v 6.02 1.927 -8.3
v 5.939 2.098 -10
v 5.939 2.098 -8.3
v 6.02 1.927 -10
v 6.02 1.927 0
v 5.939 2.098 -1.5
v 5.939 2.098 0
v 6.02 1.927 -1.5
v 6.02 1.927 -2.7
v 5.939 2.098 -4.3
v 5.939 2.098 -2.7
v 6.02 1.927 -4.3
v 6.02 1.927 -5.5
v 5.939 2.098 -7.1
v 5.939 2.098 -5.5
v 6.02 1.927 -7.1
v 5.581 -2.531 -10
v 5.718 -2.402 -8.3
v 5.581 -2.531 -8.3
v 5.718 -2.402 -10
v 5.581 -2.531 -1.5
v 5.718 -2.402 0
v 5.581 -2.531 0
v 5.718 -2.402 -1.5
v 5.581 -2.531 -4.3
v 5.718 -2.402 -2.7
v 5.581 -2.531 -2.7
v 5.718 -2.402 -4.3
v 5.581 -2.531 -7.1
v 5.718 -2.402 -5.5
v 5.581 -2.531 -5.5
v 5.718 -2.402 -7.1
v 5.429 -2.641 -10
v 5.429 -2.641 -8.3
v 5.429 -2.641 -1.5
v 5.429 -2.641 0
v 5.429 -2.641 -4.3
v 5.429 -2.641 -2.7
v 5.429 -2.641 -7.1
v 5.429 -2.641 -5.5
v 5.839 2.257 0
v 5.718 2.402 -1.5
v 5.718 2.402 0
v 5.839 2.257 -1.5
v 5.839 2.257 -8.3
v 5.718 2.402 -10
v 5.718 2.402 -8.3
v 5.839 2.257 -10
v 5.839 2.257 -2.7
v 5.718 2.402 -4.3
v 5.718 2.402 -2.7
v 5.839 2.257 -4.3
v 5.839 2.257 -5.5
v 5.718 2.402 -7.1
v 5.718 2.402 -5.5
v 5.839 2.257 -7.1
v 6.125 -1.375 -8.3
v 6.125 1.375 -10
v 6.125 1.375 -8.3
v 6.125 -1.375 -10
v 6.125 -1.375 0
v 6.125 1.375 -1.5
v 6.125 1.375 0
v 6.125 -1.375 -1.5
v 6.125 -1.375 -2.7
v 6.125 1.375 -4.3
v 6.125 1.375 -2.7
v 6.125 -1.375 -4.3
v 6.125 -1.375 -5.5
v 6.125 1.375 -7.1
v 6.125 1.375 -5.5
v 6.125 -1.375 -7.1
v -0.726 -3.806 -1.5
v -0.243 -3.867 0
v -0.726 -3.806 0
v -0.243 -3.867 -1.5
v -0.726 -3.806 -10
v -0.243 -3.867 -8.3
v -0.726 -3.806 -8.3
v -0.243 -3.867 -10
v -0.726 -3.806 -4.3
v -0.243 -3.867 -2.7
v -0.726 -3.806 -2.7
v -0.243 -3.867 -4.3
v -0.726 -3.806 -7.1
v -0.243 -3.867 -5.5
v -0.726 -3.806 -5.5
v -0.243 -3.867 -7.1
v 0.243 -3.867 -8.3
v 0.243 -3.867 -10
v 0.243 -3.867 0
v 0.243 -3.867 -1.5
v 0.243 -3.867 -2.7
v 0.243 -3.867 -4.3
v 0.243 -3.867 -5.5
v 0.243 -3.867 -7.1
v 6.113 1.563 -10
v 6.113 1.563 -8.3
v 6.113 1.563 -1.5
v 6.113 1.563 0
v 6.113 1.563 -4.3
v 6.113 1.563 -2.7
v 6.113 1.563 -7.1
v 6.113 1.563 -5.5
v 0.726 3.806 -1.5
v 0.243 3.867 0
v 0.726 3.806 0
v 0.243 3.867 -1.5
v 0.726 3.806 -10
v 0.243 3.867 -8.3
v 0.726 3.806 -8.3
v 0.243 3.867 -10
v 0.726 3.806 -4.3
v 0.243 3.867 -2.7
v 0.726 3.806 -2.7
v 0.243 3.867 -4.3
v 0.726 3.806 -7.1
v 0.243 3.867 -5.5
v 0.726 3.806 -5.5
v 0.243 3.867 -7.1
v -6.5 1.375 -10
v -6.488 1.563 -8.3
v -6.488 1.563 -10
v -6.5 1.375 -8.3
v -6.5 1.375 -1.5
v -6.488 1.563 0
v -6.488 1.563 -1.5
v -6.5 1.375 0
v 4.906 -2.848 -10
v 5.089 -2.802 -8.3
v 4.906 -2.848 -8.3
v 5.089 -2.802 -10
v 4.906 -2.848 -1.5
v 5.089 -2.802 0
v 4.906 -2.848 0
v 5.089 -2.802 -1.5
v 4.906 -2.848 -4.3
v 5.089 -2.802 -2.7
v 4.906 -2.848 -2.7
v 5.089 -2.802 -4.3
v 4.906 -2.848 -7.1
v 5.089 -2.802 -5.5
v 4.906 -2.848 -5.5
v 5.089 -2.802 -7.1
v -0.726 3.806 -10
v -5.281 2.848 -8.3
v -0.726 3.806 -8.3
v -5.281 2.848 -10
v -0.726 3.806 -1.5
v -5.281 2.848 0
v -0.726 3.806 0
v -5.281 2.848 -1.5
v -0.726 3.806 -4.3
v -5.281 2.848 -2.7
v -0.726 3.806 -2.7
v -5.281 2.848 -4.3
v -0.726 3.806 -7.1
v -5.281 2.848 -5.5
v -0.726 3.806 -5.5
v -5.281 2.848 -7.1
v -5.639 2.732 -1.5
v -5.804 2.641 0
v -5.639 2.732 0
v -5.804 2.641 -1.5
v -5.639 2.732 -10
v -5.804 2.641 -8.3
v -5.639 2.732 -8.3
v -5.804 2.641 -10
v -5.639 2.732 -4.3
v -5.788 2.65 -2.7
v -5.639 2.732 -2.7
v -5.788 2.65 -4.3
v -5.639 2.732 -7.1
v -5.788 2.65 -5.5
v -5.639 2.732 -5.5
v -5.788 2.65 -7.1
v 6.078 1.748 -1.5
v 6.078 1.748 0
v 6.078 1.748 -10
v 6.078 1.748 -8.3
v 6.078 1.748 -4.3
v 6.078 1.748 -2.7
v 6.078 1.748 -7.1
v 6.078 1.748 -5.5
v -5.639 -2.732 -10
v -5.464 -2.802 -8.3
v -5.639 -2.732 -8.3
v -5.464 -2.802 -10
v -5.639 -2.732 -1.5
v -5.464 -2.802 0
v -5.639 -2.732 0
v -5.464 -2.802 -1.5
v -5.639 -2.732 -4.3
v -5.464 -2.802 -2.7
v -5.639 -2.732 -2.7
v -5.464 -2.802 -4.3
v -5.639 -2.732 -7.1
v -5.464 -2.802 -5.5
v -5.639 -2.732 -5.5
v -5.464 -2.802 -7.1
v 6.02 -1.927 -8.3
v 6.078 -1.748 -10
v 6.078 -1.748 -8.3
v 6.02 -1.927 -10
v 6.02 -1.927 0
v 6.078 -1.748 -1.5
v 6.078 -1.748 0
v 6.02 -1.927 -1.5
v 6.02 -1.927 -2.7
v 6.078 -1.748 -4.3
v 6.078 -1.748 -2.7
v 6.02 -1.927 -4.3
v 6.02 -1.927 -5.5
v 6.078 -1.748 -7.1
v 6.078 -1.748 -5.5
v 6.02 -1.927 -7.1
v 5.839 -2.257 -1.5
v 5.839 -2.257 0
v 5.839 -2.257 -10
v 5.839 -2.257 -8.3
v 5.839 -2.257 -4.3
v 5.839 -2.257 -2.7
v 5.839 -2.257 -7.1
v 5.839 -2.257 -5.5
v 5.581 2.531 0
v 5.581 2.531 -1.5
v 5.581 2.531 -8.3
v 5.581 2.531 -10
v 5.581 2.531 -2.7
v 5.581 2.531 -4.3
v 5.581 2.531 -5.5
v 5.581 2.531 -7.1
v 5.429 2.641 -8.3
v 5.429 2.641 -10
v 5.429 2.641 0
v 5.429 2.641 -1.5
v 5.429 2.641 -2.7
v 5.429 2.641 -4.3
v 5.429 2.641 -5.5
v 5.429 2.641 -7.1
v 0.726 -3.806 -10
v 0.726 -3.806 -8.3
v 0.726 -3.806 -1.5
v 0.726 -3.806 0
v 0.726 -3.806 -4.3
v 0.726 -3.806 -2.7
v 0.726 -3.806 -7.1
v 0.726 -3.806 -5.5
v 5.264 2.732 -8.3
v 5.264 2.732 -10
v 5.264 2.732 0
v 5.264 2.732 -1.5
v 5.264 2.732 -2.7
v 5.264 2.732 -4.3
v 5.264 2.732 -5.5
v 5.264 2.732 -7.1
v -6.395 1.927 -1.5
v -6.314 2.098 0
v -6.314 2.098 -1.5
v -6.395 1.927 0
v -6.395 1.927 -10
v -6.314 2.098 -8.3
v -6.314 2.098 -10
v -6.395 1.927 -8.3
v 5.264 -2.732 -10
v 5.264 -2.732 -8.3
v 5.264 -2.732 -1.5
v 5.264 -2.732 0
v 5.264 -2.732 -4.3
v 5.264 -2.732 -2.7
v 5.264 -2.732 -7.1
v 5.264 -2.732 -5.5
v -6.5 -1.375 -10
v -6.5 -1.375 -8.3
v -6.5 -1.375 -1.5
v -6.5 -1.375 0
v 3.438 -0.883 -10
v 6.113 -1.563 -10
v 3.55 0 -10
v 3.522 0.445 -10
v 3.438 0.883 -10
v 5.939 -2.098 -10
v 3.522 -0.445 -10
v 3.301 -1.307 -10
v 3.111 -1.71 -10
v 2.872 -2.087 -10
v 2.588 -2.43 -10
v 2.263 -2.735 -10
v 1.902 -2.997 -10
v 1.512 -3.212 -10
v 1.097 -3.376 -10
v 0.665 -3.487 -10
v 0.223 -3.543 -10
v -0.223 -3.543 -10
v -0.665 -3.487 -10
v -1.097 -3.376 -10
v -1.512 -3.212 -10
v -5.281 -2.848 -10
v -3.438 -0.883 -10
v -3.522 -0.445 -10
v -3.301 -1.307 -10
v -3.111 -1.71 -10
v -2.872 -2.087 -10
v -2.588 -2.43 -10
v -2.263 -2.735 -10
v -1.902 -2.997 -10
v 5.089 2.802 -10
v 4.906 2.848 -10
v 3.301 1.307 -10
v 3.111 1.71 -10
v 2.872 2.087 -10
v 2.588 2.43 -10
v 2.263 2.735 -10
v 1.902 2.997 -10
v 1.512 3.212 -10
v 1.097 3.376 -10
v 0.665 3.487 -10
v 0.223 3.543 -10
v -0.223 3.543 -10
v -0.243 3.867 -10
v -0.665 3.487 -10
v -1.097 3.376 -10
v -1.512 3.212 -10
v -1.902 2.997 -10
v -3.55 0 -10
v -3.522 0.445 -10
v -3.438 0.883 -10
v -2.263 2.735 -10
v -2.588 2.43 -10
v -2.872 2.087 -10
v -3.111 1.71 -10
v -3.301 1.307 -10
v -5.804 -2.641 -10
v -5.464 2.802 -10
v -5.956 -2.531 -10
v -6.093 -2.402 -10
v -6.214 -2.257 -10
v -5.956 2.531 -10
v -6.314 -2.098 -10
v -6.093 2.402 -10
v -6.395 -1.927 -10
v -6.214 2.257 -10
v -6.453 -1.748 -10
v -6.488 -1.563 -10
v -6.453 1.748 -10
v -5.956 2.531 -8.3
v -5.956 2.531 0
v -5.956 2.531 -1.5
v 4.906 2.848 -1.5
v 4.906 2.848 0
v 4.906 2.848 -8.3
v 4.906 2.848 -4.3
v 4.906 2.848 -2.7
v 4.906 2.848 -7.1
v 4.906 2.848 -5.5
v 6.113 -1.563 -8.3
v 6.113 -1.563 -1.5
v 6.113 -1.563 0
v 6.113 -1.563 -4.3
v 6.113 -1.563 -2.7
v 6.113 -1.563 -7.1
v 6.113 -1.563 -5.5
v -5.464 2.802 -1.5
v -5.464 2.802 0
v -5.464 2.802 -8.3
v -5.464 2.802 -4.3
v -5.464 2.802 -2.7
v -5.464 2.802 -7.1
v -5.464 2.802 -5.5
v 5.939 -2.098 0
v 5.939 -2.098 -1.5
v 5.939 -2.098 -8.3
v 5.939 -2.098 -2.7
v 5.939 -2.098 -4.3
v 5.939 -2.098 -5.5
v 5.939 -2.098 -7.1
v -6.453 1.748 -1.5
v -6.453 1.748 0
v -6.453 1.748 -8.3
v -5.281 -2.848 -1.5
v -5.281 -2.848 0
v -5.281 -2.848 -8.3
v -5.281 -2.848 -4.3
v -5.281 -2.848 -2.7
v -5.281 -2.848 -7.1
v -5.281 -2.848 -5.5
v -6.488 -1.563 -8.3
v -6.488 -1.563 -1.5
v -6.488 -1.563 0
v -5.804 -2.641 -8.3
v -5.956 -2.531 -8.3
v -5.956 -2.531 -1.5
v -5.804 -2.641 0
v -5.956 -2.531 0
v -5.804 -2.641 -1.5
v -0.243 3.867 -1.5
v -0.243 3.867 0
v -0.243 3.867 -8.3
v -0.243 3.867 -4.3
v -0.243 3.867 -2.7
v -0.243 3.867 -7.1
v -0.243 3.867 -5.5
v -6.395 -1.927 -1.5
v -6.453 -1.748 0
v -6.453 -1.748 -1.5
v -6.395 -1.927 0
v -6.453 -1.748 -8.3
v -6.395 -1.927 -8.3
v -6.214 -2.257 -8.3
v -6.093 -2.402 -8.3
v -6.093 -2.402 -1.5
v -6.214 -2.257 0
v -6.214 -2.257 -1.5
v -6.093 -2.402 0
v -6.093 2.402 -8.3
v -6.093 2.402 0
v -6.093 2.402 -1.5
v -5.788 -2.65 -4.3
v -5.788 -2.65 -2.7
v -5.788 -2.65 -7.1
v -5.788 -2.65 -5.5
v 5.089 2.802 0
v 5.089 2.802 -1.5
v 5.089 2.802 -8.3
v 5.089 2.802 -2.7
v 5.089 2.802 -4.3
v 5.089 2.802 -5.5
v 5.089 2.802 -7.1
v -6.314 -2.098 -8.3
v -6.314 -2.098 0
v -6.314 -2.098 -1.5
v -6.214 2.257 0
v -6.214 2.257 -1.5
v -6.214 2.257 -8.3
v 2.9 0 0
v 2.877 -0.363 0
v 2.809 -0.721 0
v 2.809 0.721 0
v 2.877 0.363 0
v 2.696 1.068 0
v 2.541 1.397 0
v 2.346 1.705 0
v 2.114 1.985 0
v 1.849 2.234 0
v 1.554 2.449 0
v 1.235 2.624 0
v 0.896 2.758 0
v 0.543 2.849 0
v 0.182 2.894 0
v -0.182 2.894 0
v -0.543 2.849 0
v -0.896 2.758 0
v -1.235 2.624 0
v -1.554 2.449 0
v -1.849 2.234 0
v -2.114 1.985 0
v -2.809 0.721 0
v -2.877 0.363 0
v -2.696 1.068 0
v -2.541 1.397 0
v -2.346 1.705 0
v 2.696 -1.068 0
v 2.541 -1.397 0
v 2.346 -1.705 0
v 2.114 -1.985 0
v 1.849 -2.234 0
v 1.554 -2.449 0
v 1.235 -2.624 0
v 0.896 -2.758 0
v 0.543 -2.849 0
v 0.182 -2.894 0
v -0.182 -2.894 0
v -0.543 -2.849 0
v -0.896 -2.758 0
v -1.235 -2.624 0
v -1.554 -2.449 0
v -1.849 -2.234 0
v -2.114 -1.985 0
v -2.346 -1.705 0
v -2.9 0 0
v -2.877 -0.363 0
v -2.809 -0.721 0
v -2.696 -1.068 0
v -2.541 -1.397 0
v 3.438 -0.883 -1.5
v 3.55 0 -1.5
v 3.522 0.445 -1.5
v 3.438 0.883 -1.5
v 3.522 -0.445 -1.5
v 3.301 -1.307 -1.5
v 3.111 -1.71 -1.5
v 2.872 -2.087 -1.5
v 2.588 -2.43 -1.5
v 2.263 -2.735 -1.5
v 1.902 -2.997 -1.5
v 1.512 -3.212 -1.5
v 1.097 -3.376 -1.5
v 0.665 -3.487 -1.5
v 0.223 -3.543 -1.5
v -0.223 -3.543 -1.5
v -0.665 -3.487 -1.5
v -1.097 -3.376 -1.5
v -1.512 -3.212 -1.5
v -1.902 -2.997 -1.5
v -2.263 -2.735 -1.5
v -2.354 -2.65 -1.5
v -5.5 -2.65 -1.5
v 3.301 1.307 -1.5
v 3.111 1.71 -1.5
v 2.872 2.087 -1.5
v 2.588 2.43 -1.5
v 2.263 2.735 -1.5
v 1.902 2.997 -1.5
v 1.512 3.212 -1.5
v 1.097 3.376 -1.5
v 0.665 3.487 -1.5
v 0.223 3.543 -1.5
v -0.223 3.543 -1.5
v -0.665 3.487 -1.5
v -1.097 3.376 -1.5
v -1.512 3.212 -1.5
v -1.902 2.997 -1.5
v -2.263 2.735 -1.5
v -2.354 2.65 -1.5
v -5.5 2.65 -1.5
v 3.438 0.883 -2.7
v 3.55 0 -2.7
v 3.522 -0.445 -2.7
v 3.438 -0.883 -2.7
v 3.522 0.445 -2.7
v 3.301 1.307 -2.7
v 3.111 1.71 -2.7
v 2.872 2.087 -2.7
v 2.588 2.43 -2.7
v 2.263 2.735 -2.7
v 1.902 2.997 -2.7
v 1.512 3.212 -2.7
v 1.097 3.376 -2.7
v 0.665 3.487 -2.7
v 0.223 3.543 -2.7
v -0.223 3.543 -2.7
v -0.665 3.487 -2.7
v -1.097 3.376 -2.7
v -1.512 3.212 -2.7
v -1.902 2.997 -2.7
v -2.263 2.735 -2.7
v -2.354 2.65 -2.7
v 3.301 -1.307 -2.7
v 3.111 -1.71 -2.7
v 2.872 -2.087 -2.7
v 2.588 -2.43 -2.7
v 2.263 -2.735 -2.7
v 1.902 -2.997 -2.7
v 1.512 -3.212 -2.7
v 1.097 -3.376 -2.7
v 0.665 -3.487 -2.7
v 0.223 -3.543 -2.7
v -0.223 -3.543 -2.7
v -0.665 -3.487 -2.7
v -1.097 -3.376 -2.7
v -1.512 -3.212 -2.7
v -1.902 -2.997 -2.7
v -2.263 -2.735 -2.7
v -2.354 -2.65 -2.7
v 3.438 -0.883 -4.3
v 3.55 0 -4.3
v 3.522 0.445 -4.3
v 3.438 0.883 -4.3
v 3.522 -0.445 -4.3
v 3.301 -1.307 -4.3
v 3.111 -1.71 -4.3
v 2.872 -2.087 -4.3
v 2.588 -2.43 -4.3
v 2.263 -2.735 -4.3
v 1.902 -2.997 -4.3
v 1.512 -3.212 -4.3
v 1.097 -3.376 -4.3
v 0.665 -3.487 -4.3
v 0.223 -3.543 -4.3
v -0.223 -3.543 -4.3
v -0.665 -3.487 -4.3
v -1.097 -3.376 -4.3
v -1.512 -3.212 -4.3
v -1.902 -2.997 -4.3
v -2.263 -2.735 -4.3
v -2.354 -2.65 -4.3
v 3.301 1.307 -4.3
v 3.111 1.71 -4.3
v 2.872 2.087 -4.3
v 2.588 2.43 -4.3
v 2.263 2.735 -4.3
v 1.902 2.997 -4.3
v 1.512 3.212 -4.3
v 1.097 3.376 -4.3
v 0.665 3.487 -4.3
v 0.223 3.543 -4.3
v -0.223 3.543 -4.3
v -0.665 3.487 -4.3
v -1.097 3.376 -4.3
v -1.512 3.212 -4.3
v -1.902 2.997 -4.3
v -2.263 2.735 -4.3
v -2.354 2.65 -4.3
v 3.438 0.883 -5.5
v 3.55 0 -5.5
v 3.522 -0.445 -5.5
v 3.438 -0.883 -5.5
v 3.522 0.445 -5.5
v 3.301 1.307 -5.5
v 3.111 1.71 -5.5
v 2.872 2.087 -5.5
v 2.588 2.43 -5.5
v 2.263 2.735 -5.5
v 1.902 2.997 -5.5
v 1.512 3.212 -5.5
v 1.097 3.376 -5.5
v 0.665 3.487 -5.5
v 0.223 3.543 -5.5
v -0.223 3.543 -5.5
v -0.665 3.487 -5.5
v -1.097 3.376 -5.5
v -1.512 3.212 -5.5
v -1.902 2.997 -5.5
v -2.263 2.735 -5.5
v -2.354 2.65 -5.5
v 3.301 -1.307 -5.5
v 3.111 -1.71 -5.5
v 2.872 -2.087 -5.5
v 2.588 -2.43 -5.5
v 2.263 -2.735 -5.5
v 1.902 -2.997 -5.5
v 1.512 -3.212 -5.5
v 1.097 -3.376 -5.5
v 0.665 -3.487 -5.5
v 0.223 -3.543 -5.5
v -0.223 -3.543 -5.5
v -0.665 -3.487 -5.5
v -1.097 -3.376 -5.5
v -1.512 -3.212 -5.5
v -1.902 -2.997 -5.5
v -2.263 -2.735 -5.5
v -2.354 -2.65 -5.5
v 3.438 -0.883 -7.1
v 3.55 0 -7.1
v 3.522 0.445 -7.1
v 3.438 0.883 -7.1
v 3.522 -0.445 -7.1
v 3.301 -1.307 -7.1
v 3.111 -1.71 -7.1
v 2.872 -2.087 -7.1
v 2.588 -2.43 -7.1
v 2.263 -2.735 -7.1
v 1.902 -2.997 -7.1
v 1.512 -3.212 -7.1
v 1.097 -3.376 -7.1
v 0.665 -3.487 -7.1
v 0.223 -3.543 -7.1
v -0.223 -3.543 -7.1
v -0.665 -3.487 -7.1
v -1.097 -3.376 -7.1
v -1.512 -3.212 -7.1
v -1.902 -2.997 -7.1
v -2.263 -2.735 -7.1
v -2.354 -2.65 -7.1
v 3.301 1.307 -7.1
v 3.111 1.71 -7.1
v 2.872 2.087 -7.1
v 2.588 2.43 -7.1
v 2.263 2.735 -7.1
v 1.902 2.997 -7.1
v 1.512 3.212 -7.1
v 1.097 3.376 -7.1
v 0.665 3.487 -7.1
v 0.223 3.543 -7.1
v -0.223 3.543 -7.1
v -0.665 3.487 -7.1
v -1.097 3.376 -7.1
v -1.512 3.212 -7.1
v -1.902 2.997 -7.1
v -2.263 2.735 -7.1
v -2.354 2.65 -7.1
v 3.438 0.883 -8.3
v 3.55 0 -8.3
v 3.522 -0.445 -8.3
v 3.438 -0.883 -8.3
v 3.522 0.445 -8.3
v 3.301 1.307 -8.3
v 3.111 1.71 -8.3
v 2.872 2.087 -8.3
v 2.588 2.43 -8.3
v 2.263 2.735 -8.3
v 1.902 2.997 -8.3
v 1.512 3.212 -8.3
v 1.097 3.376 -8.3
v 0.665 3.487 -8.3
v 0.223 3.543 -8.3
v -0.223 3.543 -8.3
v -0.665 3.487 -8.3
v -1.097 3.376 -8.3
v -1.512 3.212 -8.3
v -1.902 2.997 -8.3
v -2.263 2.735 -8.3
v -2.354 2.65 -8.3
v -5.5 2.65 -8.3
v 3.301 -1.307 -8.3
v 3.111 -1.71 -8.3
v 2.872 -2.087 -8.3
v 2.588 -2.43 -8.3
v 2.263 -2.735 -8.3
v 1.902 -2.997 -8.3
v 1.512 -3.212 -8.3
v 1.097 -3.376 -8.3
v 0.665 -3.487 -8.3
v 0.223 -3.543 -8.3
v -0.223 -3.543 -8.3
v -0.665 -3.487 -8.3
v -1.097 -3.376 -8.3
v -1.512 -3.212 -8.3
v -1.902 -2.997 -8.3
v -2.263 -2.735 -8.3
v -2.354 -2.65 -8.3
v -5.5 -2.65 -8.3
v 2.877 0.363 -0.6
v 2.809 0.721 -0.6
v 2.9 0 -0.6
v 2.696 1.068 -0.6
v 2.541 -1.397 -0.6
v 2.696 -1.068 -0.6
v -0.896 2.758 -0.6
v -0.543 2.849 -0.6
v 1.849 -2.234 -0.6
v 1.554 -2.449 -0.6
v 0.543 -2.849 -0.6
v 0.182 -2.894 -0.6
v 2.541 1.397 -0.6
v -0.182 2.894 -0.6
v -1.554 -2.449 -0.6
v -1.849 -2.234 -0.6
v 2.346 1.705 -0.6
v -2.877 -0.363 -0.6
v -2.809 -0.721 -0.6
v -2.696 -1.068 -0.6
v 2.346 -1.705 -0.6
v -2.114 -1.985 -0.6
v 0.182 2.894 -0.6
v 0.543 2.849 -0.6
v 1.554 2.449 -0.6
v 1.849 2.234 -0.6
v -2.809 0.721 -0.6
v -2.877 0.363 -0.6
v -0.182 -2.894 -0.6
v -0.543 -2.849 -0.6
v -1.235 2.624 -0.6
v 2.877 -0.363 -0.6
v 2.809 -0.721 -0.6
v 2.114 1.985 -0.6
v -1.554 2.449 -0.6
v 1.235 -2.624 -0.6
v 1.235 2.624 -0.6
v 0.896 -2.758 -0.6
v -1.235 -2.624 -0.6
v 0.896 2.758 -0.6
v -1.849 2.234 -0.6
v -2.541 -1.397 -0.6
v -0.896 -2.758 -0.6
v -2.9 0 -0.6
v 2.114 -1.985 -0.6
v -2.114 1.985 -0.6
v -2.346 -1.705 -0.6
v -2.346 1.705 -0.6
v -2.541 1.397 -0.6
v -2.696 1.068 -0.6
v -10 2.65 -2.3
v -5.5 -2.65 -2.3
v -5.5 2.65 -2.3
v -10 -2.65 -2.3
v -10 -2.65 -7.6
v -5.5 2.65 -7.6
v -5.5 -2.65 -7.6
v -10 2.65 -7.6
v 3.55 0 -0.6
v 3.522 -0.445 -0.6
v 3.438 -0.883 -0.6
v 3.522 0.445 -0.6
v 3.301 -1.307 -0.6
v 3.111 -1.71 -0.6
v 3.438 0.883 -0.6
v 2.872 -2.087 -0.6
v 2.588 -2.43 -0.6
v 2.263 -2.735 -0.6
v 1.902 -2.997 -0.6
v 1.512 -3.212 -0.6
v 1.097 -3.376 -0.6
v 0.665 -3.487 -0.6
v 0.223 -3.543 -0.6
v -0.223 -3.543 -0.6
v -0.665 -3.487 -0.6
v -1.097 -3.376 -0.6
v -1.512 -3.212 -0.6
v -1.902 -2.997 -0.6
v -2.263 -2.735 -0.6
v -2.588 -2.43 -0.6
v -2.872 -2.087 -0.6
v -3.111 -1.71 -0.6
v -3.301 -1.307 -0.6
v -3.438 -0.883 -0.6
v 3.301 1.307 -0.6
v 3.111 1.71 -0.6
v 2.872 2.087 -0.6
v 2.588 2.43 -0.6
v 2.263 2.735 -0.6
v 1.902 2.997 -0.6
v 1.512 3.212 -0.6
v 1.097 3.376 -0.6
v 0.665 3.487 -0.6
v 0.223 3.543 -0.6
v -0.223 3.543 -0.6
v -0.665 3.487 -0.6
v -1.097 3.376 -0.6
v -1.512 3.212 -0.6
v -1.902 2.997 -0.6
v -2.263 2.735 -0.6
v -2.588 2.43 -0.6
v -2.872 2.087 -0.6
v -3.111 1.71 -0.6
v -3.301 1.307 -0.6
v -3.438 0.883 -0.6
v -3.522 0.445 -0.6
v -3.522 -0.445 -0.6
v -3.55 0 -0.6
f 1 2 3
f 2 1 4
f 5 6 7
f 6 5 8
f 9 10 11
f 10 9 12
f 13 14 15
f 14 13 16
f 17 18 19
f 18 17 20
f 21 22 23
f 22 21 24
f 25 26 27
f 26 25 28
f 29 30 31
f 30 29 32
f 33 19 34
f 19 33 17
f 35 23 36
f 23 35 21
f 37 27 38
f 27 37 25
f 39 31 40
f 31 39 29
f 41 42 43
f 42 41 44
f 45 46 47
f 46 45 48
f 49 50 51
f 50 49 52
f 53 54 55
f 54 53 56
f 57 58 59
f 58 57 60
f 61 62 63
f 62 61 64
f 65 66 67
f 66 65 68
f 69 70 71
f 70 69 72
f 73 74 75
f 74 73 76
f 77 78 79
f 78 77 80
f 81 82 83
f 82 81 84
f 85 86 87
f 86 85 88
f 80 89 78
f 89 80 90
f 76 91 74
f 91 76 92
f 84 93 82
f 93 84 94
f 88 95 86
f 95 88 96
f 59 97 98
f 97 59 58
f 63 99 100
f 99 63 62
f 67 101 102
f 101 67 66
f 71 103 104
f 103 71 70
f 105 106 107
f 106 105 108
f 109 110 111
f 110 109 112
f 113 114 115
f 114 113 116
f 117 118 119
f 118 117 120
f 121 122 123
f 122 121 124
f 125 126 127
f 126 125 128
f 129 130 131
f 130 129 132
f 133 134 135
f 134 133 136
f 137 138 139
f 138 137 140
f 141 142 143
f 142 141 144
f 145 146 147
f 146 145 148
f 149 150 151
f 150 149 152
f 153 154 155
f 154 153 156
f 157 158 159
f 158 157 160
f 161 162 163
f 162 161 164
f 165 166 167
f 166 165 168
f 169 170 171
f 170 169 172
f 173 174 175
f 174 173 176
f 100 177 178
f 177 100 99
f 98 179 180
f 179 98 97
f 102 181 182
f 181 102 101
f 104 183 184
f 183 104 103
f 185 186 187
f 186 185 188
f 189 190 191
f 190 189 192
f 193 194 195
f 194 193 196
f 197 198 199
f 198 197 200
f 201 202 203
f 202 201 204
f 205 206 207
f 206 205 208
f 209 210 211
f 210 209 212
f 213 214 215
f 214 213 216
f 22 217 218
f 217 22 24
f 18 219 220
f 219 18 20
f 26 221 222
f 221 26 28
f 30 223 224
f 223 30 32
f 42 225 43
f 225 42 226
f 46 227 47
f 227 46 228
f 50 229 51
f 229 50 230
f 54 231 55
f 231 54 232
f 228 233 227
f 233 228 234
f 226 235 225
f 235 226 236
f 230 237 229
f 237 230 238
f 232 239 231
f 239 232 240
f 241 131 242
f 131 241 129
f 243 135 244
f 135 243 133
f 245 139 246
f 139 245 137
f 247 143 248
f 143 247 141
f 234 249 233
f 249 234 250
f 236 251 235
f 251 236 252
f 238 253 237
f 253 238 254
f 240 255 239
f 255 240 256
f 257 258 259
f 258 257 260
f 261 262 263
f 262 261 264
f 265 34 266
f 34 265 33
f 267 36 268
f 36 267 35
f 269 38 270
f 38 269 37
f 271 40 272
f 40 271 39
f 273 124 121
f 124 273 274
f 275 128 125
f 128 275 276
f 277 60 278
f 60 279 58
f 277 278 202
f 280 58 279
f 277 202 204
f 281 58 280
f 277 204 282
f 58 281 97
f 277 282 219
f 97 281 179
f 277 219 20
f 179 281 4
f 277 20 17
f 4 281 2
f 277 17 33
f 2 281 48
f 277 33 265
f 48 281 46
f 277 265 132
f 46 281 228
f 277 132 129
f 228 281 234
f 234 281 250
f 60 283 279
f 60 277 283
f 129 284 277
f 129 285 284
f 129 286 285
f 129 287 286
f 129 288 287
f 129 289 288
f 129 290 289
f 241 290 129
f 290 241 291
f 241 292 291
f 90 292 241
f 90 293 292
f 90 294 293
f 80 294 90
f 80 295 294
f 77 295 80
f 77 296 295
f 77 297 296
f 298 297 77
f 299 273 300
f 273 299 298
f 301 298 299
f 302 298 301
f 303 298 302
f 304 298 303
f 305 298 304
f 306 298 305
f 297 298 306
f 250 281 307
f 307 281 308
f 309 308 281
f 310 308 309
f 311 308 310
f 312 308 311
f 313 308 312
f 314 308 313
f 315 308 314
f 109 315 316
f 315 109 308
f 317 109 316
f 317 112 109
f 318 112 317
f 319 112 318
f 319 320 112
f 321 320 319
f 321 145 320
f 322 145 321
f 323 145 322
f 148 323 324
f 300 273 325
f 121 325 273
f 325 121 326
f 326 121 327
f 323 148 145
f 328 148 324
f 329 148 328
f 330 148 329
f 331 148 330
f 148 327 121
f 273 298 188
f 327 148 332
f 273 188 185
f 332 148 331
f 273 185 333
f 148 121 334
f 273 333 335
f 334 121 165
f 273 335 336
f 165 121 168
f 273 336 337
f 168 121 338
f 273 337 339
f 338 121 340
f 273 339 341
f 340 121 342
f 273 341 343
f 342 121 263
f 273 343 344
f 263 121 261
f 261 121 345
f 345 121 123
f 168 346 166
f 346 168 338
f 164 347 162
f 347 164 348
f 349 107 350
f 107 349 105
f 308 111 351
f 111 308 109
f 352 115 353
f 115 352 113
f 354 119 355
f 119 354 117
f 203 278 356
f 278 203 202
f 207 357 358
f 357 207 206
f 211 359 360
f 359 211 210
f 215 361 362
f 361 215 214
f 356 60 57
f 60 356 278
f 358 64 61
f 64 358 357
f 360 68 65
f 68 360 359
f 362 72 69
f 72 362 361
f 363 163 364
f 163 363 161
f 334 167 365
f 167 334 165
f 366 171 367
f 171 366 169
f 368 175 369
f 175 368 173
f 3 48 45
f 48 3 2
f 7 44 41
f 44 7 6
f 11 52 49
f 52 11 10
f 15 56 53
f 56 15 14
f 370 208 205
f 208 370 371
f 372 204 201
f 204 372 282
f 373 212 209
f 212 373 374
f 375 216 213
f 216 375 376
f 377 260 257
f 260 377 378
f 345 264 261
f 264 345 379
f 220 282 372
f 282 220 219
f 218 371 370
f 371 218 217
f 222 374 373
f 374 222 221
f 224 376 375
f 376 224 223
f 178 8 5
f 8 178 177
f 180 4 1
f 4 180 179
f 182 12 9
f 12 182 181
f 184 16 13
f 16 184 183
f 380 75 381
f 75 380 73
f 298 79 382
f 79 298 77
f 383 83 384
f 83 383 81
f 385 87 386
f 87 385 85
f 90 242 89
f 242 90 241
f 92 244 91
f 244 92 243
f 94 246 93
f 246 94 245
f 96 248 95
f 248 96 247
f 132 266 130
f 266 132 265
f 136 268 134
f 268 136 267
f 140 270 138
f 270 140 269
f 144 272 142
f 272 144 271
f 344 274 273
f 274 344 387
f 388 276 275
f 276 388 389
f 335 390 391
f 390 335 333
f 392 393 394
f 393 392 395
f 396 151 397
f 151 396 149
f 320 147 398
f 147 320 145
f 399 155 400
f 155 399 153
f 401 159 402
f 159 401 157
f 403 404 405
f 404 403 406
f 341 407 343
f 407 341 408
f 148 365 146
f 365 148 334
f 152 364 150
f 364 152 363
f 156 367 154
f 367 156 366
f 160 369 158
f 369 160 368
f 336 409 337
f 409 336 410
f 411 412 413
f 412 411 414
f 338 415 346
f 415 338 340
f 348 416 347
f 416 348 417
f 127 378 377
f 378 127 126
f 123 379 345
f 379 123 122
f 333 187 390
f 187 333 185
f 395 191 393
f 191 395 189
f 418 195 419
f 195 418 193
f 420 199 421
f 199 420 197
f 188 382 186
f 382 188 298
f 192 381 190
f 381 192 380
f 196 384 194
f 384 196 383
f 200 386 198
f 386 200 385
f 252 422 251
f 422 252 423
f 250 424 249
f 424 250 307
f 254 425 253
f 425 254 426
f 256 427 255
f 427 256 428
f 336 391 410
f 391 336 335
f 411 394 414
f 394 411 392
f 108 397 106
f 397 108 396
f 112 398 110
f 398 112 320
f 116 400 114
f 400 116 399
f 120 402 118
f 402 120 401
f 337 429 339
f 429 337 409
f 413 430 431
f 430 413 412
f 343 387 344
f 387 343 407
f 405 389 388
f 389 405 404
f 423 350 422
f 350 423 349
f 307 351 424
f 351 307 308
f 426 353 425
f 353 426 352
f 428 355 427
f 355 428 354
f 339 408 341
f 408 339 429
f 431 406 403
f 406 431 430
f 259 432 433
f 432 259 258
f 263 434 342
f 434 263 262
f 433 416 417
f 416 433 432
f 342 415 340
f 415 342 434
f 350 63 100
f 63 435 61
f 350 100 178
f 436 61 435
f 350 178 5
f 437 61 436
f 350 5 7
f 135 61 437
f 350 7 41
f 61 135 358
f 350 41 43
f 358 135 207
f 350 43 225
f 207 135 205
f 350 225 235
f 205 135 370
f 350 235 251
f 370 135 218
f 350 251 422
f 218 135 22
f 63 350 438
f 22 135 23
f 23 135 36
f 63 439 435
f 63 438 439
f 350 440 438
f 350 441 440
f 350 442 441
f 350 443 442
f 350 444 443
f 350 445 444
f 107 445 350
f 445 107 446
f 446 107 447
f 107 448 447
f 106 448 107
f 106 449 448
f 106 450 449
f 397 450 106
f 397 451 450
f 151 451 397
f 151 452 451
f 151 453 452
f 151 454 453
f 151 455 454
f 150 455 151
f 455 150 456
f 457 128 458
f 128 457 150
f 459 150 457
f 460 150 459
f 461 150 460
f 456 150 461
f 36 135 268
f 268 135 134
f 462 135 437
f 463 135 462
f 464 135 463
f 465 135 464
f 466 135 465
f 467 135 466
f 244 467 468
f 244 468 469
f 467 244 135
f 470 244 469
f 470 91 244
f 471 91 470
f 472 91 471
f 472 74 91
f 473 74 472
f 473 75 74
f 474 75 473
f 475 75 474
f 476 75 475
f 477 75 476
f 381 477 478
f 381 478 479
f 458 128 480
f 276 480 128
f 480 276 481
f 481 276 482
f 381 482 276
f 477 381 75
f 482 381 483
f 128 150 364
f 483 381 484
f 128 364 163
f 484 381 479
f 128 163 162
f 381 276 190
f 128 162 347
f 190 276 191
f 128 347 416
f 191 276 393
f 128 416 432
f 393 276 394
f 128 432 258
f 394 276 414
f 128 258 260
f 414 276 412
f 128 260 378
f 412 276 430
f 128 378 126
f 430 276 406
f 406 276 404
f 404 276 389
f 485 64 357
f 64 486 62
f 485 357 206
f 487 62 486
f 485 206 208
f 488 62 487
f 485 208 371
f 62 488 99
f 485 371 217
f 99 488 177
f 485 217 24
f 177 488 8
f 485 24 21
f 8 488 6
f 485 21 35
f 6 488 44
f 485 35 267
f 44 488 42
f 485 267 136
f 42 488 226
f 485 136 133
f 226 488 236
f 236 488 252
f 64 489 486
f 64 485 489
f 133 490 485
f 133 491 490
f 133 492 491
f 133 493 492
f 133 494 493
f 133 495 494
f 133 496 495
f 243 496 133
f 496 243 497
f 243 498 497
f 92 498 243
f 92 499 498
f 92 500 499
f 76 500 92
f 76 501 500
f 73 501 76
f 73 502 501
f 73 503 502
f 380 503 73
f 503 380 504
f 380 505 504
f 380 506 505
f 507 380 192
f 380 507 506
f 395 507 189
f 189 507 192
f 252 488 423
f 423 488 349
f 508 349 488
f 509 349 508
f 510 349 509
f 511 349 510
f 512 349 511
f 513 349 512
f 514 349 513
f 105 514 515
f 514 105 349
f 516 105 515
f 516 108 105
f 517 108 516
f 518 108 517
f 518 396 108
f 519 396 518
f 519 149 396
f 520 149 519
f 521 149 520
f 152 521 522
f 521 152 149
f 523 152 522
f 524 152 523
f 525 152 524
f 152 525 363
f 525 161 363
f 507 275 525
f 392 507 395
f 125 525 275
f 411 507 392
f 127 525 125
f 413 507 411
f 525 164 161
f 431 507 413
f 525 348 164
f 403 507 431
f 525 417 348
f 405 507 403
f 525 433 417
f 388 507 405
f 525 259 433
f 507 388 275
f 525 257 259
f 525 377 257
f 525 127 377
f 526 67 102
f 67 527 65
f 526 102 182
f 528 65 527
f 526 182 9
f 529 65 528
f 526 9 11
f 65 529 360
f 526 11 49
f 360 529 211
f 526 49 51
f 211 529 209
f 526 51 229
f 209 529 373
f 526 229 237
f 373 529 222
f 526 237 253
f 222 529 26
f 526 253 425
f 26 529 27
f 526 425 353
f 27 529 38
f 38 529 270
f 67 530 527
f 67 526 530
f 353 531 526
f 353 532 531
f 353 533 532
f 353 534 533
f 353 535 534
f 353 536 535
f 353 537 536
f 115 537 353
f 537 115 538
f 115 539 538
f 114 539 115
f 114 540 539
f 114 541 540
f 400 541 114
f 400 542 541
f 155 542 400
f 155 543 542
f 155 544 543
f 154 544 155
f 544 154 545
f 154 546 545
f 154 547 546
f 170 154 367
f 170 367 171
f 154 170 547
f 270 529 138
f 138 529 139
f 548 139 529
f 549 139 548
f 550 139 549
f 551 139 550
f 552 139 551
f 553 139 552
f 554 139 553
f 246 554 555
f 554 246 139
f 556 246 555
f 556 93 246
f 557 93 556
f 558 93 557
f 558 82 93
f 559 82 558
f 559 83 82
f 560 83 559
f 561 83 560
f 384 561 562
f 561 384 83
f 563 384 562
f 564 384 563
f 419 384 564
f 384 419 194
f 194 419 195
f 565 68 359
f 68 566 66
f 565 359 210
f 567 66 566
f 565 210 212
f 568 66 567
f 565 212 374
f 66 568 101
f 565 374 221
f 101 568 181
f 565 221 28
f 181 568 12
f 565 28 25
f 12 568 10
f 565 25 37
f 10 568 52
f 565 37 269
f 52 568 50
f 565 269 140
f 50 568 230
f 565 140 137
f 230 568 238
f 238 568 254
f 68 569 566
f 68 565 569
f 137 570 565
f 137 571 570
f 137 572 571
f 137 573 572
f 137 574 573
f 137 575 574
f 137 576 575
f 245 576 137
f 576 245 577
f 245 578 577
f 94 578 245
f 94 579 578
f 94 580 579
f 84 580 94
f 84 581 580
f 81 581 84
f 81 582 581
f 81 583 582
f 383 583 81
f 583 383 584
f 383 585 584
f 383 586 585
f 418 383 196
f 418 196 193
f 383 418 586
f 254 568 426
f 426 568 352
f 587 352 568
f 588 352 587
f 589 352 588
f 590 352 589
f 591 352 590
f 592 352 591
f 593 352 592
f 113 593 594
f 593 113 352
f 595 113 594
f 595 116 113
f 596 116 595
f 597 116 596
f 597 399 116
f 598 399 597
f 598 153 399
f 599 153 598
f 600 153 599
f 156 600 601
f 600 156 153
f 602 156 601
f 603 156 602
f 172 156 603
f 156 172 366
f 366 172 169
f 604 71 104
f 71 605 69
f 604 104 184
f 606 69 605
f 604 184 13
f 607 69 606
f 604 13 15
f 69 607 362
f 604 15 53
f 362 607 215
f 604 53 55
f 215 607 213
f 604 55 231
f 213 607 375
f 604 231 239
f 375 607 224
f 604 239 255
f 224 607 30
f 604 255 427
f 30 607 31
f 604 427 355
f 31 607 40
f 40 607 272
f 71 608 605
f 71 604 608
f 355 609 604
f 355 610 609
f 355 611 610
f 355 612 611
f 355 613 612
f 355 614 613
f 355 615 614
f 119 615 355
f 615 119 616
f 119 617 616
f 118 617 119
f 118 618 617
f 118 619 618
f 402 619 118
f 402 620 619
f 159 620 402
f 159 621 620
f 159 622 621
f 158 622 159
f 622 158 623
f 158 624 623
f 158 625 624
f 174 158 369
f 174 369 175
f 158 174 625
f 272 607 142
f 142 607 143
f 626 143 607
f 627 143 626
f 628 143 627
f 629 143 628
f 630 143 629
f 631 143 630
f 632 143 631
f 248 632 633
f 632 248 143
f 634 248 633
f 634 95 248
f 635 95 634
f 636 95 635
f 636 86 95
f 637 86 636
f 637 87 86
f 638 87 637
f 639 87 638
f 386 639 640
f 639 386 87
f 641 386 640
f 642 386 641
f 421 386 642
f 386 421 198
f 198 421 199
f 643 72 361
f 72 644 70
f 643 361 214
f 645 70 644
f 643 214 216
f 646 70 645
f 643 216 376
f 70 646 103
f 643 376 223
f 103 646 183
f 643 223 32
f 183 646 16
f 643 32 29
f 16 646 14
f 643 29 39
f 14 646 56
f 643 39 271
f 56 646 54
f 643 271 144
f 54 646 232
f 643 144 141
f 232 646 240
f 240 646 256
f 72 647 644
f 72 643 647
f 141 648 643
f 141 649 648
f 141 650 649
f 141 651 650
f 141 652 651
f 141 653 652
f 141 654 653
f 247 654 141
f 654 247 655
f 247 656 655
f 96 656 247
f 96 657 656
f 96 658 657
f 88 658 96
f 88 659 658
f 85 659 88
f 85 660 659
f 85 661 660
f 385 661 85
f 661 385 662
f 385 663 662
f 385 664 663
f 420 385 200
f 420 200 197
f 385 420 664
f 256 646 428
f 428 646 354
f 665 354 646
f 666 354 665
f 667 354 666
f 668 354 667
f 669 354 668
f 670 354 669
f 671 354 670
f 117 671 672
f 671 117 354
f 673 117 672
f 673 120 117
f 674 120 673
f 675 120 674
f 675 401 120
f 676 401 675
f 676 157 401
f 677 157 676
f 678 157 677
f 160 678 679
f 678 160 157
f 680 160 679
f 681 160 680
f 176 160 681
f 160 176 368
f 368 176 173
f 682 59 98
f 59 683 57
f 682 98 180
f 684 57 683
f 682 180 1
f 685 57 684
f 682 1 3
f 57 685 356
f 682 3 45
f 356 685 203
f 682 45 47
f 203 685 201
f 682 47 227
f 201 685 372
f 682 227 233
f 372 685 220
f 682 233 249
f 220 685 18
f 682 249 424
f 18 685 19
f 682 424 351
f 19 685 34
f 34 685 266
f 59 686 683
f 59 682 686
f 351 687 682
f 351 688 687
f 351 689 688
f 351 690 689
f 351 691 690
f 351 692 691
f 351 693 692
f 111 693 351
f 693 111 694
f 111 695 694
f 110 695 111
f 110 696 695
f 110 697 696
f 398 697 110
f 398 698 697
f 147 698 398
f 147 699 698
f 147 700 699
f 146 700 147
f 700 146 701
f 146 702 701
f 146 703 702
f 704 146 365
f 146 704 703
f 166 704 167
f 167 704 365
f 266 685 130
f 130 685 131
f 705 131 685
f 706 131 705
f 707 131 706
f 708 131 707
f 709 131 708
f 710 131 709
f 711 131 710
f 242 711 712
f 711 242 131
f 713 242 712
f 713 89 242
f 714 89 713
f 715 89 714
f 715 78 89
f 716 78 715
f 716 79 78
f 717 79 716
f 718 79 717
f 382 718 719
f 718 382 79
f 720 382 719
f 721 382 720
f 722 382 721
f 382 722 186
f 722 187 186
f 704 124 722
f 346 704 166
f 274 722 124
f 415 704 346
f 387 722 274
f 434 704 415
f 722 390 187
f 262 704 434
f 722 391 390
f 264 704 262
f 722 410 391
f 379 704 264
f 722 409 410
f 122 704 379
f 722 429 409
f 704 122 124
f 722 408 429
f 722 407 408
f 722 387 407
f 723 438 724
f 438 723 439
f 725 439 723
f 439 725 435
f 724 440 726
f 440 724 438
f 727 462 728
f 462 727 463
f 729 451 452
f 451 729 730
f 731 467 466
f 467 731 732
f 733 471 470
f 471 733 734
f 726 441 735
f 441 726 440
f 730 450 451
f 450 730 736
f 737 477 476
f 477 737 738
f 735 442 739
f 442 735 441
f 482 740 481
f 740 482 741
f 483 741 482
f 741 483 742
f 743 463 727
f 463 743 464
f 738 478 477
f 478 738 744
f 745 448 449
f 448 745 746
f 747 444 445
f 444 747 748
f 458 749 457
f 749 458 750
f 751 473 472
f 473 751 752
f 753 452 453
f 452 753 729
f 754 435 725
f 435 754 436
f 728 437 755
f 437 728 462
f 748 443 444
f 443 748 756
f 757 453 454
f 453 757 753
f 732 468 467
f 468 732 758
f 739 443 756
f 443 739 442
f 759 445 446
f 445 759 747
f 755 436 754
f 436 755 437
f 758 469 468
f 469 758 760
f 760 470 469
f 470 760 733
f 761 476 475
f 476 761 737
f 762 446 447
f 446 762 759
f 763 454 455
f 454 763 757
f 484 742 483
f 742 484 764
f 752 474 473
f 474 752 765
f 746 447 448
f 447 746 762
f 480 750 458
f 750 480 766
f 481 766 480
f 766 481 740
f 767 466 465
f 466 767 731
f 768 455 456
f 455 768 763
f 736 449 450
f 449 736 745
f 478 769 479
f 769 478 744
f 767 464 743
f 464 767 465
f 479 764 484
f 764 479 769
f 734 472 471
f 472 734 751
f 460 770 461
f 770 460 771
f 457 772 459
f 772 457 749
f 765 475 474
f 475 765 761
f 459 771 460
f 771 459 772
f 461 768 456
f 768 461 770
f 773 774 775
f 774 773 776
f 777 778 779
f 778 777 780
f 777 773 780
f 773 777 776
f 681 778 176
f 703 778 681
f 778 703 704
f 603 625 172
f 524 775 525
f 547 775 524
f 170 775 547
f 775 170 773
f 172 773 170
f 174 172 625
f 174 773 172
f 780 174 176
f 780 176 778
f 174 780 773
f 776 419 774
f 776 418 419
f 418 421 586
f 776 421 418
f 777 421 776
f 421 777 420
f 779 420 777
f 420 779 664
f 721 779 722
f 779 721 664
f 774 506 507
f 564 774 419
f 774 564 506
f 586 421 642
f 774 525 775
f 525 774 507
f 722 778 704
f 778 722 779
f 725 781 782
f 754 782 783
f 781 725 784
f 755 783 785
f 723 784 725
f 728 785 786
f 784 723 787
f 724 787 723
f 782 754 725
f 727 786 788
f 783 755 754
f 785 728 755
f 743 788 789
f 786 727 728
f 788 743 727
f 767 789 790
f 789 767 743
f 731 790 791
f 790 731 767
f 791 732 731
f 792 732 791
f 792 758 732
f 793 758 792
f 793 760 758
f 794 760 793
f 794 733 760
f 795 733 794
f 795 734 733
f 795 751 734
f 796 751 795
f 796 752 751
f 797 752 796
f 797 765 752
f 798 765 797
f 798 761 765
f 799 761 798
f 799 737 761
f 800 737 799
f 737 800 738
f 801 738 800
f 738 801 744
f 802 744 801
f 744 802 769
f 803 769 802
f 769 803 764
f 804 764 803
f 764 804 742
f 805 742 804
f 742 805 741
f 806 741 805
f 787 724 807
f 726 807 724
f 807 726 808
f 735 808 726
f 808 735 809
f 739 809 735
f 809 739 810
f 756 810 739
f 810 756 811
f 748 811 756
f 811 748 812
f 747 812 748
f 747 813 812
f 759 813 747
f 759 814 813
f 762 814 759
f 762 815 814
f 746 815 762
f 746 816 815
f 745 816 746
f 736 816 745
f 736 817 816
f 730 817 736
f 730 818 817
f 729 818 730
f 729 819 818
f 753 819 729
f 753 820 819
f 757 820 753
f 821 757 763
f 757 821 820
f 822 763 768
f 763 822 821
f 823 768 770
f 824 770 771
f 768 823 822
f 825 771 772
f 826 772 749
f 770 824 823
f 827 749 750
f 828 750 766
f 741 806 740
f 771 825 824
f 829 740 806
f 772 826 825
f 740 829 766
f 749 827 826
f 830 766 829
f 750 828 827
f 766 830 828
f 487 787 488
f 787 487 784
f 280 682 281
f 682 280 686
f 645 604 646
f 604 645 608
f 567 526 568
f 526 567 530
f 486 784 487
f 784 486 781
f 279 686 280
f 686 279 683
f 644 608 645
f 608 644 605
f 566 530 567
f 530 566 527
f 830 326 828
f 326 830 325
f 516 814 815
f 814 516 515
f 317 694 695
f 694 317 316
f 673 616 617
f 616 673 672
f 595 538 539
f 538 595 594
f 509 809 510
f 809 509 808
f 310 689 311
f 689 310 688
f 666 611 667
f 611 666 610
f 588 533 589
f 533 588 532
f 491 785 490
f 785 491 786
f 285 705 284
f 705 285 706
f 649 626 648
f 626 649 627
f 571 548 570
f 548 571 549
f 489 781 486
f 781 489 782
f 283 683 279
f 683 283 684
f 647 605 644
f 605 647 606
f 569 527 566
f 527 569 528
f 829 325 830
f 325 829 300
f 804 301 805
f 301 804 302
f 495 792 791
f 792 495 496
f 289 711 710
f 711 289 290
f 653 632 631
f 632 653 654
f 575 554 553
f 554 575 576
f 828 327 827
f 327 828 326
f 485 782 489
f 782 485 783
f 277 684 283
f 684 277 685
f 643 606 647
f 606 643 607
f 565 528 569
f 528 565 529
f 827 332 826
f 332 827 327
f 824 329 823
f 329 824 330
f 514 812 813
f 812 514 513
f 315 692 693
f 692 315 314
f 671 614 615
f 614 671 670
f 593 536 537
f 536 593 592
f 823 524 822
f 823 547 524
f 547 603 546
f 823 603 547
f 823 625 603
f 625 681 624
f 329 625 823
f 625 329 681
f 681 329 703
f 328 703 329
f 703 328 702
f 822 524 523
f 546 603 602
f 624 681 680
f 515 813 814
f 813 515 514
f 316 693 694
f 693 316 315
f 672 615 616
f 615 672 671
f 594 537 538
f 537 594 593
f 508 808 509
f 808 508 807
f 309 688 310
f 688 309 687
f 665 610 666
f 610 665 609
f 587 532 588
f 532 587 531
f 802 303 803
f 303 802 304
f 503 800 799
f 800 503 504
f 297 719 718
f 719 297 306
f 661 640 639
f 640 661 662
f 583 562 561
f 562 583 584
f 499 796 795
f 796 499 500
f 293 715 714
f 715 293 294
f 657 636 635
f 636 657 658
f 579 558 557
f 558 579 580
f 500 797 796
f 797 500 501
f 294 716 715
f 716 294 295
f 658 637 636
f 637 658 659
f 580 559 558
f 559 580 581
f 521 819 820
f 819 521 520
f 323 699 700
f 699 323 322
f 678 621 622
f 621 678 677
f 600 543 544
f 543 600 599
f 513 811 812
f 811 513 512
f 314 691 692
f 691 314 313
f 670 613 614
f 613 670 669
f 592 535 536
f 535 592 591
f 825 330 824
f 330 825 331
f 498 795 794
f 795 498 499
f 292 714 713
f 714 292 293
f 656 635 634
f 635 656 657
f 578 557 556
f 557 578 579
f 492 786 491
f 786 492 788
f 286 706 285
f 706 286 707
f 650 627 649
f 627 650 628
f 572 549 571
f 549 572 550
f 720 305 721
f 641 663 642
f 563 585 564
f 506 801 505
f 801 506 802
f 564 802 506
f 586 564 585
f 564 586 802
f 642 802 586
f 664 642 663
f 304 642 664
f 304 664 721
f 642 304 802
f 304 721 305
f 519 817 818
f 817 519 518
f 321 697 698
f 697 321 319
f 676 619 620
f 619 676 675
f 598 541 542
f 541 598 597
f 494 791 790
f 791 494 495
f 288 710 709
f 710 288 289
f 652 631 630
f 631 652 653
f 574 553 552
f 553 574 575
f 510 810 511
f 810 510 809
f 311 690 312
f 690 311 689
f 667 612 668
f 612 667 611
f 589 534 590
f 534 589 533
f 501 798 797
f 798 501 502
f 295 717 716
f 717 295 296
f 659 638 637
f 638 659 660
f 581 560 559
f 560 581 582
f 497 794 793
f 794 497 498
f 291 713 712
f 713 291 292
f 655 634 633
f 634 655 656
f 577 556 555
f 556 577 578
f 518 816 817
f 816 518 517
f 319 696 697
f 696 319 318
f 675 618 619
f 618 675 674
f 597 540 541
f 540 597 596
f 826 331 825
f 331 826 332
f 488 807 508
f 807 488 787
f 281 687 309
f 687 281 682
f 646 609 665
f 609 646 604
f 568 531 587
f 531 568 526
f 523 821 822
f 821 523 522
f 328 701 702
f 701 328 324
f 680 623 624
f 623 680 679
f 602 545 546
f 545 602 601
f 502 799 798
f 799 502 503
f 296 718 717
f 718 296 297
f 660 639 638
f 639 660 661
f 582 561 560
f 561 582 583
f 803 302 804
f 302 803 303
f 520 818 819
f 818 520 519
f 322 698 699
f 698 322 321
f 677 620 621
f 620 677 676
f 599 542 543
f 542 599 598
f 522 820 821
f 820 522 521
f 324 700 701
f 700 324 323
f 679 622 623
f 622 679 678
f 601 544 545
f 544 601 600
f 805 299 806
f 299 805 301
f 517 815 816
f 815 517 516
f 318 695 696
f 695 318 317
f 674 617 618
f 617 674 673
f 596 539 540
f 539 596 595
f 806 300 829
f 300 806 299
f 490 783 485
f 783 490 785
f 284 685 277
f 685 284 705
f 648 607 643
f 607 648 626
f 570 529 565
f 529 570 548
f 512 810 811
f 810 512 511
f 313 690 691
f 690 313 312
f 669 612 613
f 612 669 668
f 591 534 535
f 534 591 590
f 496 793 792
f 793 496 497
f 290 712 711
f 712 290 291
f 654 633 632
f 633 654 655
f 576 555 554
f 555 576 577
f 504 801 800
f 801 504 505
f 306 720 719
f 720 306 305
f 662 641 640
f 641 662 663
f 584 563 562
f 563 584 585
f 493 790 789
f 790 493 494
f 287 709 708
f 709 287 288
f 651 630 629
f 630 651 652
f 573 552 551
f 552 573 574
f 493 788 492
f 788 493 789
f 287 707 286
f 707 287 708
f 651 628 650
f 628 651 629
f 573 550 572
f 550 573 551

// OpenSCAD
$fn=50;

motor_diam = 7.1;
motor_length = 20; // estimate
shaft_diam = 1;
shaft_length = 4.5;

module motor() {
  color("Silver") translate([0,0,shaft_length/2 + motor_length/2]) cylinder(r=shaft_diam/2, h=shaft_length, center=true);
  color("Gray") cylinder(r=motor_diam/2, h=20, center=true);
}

mount_diam = 7.75;
mount_height = 10;

module mount() {
  difference() {
    union() {
      difference() {
        translate([0,0,-mount_height/2]) {
          hull() {
            translate([-5, 1.375, 0]) cylinder(r=1.5, h=mount_height, center=true);
            translate([-5, -1.375, 0]) cylinder(r=1.5, h=mount_height, center=true);
            cylinder(r=mount_diam/2, h=mount_height, center=true);
            translate([8.5-(mount_diam/2), 1.375, 0]) cylinder(r=1.5, h=mount_height, center=true);
            translate([8.5-(mount_diam/2), -1.375, 0]) cylinder(r=1.5, h=mount_height, center=true);
          }
        }

        translate([0,0,-1.2 - 1.5]) cylinder(r=20, h=1.2); // first "fin" is shorter than the rest
        translate([0,0,-1.2 -1.5 -1.2 -1.6]) cylinder(r=20, h=1.2);
        translate([0,0,-1.2 -1.5 -1.2 -1.6 -1.2 -1.6]) cylinder(r=20, h=1.2);

        cylinder(r=2.9, h=10, center=true); // hole for axle
      }
      translate([-5,0,-2.65-2.3]) cube(size=[10, 5.3, 5.3], center=true);
      translate([-3.5,0,-5]) cube(size=[4, 5.3, 8], center=true);
    }
    translate([0,0,-motor_length/2 -0.6]) motor();
  }

}

mount();
